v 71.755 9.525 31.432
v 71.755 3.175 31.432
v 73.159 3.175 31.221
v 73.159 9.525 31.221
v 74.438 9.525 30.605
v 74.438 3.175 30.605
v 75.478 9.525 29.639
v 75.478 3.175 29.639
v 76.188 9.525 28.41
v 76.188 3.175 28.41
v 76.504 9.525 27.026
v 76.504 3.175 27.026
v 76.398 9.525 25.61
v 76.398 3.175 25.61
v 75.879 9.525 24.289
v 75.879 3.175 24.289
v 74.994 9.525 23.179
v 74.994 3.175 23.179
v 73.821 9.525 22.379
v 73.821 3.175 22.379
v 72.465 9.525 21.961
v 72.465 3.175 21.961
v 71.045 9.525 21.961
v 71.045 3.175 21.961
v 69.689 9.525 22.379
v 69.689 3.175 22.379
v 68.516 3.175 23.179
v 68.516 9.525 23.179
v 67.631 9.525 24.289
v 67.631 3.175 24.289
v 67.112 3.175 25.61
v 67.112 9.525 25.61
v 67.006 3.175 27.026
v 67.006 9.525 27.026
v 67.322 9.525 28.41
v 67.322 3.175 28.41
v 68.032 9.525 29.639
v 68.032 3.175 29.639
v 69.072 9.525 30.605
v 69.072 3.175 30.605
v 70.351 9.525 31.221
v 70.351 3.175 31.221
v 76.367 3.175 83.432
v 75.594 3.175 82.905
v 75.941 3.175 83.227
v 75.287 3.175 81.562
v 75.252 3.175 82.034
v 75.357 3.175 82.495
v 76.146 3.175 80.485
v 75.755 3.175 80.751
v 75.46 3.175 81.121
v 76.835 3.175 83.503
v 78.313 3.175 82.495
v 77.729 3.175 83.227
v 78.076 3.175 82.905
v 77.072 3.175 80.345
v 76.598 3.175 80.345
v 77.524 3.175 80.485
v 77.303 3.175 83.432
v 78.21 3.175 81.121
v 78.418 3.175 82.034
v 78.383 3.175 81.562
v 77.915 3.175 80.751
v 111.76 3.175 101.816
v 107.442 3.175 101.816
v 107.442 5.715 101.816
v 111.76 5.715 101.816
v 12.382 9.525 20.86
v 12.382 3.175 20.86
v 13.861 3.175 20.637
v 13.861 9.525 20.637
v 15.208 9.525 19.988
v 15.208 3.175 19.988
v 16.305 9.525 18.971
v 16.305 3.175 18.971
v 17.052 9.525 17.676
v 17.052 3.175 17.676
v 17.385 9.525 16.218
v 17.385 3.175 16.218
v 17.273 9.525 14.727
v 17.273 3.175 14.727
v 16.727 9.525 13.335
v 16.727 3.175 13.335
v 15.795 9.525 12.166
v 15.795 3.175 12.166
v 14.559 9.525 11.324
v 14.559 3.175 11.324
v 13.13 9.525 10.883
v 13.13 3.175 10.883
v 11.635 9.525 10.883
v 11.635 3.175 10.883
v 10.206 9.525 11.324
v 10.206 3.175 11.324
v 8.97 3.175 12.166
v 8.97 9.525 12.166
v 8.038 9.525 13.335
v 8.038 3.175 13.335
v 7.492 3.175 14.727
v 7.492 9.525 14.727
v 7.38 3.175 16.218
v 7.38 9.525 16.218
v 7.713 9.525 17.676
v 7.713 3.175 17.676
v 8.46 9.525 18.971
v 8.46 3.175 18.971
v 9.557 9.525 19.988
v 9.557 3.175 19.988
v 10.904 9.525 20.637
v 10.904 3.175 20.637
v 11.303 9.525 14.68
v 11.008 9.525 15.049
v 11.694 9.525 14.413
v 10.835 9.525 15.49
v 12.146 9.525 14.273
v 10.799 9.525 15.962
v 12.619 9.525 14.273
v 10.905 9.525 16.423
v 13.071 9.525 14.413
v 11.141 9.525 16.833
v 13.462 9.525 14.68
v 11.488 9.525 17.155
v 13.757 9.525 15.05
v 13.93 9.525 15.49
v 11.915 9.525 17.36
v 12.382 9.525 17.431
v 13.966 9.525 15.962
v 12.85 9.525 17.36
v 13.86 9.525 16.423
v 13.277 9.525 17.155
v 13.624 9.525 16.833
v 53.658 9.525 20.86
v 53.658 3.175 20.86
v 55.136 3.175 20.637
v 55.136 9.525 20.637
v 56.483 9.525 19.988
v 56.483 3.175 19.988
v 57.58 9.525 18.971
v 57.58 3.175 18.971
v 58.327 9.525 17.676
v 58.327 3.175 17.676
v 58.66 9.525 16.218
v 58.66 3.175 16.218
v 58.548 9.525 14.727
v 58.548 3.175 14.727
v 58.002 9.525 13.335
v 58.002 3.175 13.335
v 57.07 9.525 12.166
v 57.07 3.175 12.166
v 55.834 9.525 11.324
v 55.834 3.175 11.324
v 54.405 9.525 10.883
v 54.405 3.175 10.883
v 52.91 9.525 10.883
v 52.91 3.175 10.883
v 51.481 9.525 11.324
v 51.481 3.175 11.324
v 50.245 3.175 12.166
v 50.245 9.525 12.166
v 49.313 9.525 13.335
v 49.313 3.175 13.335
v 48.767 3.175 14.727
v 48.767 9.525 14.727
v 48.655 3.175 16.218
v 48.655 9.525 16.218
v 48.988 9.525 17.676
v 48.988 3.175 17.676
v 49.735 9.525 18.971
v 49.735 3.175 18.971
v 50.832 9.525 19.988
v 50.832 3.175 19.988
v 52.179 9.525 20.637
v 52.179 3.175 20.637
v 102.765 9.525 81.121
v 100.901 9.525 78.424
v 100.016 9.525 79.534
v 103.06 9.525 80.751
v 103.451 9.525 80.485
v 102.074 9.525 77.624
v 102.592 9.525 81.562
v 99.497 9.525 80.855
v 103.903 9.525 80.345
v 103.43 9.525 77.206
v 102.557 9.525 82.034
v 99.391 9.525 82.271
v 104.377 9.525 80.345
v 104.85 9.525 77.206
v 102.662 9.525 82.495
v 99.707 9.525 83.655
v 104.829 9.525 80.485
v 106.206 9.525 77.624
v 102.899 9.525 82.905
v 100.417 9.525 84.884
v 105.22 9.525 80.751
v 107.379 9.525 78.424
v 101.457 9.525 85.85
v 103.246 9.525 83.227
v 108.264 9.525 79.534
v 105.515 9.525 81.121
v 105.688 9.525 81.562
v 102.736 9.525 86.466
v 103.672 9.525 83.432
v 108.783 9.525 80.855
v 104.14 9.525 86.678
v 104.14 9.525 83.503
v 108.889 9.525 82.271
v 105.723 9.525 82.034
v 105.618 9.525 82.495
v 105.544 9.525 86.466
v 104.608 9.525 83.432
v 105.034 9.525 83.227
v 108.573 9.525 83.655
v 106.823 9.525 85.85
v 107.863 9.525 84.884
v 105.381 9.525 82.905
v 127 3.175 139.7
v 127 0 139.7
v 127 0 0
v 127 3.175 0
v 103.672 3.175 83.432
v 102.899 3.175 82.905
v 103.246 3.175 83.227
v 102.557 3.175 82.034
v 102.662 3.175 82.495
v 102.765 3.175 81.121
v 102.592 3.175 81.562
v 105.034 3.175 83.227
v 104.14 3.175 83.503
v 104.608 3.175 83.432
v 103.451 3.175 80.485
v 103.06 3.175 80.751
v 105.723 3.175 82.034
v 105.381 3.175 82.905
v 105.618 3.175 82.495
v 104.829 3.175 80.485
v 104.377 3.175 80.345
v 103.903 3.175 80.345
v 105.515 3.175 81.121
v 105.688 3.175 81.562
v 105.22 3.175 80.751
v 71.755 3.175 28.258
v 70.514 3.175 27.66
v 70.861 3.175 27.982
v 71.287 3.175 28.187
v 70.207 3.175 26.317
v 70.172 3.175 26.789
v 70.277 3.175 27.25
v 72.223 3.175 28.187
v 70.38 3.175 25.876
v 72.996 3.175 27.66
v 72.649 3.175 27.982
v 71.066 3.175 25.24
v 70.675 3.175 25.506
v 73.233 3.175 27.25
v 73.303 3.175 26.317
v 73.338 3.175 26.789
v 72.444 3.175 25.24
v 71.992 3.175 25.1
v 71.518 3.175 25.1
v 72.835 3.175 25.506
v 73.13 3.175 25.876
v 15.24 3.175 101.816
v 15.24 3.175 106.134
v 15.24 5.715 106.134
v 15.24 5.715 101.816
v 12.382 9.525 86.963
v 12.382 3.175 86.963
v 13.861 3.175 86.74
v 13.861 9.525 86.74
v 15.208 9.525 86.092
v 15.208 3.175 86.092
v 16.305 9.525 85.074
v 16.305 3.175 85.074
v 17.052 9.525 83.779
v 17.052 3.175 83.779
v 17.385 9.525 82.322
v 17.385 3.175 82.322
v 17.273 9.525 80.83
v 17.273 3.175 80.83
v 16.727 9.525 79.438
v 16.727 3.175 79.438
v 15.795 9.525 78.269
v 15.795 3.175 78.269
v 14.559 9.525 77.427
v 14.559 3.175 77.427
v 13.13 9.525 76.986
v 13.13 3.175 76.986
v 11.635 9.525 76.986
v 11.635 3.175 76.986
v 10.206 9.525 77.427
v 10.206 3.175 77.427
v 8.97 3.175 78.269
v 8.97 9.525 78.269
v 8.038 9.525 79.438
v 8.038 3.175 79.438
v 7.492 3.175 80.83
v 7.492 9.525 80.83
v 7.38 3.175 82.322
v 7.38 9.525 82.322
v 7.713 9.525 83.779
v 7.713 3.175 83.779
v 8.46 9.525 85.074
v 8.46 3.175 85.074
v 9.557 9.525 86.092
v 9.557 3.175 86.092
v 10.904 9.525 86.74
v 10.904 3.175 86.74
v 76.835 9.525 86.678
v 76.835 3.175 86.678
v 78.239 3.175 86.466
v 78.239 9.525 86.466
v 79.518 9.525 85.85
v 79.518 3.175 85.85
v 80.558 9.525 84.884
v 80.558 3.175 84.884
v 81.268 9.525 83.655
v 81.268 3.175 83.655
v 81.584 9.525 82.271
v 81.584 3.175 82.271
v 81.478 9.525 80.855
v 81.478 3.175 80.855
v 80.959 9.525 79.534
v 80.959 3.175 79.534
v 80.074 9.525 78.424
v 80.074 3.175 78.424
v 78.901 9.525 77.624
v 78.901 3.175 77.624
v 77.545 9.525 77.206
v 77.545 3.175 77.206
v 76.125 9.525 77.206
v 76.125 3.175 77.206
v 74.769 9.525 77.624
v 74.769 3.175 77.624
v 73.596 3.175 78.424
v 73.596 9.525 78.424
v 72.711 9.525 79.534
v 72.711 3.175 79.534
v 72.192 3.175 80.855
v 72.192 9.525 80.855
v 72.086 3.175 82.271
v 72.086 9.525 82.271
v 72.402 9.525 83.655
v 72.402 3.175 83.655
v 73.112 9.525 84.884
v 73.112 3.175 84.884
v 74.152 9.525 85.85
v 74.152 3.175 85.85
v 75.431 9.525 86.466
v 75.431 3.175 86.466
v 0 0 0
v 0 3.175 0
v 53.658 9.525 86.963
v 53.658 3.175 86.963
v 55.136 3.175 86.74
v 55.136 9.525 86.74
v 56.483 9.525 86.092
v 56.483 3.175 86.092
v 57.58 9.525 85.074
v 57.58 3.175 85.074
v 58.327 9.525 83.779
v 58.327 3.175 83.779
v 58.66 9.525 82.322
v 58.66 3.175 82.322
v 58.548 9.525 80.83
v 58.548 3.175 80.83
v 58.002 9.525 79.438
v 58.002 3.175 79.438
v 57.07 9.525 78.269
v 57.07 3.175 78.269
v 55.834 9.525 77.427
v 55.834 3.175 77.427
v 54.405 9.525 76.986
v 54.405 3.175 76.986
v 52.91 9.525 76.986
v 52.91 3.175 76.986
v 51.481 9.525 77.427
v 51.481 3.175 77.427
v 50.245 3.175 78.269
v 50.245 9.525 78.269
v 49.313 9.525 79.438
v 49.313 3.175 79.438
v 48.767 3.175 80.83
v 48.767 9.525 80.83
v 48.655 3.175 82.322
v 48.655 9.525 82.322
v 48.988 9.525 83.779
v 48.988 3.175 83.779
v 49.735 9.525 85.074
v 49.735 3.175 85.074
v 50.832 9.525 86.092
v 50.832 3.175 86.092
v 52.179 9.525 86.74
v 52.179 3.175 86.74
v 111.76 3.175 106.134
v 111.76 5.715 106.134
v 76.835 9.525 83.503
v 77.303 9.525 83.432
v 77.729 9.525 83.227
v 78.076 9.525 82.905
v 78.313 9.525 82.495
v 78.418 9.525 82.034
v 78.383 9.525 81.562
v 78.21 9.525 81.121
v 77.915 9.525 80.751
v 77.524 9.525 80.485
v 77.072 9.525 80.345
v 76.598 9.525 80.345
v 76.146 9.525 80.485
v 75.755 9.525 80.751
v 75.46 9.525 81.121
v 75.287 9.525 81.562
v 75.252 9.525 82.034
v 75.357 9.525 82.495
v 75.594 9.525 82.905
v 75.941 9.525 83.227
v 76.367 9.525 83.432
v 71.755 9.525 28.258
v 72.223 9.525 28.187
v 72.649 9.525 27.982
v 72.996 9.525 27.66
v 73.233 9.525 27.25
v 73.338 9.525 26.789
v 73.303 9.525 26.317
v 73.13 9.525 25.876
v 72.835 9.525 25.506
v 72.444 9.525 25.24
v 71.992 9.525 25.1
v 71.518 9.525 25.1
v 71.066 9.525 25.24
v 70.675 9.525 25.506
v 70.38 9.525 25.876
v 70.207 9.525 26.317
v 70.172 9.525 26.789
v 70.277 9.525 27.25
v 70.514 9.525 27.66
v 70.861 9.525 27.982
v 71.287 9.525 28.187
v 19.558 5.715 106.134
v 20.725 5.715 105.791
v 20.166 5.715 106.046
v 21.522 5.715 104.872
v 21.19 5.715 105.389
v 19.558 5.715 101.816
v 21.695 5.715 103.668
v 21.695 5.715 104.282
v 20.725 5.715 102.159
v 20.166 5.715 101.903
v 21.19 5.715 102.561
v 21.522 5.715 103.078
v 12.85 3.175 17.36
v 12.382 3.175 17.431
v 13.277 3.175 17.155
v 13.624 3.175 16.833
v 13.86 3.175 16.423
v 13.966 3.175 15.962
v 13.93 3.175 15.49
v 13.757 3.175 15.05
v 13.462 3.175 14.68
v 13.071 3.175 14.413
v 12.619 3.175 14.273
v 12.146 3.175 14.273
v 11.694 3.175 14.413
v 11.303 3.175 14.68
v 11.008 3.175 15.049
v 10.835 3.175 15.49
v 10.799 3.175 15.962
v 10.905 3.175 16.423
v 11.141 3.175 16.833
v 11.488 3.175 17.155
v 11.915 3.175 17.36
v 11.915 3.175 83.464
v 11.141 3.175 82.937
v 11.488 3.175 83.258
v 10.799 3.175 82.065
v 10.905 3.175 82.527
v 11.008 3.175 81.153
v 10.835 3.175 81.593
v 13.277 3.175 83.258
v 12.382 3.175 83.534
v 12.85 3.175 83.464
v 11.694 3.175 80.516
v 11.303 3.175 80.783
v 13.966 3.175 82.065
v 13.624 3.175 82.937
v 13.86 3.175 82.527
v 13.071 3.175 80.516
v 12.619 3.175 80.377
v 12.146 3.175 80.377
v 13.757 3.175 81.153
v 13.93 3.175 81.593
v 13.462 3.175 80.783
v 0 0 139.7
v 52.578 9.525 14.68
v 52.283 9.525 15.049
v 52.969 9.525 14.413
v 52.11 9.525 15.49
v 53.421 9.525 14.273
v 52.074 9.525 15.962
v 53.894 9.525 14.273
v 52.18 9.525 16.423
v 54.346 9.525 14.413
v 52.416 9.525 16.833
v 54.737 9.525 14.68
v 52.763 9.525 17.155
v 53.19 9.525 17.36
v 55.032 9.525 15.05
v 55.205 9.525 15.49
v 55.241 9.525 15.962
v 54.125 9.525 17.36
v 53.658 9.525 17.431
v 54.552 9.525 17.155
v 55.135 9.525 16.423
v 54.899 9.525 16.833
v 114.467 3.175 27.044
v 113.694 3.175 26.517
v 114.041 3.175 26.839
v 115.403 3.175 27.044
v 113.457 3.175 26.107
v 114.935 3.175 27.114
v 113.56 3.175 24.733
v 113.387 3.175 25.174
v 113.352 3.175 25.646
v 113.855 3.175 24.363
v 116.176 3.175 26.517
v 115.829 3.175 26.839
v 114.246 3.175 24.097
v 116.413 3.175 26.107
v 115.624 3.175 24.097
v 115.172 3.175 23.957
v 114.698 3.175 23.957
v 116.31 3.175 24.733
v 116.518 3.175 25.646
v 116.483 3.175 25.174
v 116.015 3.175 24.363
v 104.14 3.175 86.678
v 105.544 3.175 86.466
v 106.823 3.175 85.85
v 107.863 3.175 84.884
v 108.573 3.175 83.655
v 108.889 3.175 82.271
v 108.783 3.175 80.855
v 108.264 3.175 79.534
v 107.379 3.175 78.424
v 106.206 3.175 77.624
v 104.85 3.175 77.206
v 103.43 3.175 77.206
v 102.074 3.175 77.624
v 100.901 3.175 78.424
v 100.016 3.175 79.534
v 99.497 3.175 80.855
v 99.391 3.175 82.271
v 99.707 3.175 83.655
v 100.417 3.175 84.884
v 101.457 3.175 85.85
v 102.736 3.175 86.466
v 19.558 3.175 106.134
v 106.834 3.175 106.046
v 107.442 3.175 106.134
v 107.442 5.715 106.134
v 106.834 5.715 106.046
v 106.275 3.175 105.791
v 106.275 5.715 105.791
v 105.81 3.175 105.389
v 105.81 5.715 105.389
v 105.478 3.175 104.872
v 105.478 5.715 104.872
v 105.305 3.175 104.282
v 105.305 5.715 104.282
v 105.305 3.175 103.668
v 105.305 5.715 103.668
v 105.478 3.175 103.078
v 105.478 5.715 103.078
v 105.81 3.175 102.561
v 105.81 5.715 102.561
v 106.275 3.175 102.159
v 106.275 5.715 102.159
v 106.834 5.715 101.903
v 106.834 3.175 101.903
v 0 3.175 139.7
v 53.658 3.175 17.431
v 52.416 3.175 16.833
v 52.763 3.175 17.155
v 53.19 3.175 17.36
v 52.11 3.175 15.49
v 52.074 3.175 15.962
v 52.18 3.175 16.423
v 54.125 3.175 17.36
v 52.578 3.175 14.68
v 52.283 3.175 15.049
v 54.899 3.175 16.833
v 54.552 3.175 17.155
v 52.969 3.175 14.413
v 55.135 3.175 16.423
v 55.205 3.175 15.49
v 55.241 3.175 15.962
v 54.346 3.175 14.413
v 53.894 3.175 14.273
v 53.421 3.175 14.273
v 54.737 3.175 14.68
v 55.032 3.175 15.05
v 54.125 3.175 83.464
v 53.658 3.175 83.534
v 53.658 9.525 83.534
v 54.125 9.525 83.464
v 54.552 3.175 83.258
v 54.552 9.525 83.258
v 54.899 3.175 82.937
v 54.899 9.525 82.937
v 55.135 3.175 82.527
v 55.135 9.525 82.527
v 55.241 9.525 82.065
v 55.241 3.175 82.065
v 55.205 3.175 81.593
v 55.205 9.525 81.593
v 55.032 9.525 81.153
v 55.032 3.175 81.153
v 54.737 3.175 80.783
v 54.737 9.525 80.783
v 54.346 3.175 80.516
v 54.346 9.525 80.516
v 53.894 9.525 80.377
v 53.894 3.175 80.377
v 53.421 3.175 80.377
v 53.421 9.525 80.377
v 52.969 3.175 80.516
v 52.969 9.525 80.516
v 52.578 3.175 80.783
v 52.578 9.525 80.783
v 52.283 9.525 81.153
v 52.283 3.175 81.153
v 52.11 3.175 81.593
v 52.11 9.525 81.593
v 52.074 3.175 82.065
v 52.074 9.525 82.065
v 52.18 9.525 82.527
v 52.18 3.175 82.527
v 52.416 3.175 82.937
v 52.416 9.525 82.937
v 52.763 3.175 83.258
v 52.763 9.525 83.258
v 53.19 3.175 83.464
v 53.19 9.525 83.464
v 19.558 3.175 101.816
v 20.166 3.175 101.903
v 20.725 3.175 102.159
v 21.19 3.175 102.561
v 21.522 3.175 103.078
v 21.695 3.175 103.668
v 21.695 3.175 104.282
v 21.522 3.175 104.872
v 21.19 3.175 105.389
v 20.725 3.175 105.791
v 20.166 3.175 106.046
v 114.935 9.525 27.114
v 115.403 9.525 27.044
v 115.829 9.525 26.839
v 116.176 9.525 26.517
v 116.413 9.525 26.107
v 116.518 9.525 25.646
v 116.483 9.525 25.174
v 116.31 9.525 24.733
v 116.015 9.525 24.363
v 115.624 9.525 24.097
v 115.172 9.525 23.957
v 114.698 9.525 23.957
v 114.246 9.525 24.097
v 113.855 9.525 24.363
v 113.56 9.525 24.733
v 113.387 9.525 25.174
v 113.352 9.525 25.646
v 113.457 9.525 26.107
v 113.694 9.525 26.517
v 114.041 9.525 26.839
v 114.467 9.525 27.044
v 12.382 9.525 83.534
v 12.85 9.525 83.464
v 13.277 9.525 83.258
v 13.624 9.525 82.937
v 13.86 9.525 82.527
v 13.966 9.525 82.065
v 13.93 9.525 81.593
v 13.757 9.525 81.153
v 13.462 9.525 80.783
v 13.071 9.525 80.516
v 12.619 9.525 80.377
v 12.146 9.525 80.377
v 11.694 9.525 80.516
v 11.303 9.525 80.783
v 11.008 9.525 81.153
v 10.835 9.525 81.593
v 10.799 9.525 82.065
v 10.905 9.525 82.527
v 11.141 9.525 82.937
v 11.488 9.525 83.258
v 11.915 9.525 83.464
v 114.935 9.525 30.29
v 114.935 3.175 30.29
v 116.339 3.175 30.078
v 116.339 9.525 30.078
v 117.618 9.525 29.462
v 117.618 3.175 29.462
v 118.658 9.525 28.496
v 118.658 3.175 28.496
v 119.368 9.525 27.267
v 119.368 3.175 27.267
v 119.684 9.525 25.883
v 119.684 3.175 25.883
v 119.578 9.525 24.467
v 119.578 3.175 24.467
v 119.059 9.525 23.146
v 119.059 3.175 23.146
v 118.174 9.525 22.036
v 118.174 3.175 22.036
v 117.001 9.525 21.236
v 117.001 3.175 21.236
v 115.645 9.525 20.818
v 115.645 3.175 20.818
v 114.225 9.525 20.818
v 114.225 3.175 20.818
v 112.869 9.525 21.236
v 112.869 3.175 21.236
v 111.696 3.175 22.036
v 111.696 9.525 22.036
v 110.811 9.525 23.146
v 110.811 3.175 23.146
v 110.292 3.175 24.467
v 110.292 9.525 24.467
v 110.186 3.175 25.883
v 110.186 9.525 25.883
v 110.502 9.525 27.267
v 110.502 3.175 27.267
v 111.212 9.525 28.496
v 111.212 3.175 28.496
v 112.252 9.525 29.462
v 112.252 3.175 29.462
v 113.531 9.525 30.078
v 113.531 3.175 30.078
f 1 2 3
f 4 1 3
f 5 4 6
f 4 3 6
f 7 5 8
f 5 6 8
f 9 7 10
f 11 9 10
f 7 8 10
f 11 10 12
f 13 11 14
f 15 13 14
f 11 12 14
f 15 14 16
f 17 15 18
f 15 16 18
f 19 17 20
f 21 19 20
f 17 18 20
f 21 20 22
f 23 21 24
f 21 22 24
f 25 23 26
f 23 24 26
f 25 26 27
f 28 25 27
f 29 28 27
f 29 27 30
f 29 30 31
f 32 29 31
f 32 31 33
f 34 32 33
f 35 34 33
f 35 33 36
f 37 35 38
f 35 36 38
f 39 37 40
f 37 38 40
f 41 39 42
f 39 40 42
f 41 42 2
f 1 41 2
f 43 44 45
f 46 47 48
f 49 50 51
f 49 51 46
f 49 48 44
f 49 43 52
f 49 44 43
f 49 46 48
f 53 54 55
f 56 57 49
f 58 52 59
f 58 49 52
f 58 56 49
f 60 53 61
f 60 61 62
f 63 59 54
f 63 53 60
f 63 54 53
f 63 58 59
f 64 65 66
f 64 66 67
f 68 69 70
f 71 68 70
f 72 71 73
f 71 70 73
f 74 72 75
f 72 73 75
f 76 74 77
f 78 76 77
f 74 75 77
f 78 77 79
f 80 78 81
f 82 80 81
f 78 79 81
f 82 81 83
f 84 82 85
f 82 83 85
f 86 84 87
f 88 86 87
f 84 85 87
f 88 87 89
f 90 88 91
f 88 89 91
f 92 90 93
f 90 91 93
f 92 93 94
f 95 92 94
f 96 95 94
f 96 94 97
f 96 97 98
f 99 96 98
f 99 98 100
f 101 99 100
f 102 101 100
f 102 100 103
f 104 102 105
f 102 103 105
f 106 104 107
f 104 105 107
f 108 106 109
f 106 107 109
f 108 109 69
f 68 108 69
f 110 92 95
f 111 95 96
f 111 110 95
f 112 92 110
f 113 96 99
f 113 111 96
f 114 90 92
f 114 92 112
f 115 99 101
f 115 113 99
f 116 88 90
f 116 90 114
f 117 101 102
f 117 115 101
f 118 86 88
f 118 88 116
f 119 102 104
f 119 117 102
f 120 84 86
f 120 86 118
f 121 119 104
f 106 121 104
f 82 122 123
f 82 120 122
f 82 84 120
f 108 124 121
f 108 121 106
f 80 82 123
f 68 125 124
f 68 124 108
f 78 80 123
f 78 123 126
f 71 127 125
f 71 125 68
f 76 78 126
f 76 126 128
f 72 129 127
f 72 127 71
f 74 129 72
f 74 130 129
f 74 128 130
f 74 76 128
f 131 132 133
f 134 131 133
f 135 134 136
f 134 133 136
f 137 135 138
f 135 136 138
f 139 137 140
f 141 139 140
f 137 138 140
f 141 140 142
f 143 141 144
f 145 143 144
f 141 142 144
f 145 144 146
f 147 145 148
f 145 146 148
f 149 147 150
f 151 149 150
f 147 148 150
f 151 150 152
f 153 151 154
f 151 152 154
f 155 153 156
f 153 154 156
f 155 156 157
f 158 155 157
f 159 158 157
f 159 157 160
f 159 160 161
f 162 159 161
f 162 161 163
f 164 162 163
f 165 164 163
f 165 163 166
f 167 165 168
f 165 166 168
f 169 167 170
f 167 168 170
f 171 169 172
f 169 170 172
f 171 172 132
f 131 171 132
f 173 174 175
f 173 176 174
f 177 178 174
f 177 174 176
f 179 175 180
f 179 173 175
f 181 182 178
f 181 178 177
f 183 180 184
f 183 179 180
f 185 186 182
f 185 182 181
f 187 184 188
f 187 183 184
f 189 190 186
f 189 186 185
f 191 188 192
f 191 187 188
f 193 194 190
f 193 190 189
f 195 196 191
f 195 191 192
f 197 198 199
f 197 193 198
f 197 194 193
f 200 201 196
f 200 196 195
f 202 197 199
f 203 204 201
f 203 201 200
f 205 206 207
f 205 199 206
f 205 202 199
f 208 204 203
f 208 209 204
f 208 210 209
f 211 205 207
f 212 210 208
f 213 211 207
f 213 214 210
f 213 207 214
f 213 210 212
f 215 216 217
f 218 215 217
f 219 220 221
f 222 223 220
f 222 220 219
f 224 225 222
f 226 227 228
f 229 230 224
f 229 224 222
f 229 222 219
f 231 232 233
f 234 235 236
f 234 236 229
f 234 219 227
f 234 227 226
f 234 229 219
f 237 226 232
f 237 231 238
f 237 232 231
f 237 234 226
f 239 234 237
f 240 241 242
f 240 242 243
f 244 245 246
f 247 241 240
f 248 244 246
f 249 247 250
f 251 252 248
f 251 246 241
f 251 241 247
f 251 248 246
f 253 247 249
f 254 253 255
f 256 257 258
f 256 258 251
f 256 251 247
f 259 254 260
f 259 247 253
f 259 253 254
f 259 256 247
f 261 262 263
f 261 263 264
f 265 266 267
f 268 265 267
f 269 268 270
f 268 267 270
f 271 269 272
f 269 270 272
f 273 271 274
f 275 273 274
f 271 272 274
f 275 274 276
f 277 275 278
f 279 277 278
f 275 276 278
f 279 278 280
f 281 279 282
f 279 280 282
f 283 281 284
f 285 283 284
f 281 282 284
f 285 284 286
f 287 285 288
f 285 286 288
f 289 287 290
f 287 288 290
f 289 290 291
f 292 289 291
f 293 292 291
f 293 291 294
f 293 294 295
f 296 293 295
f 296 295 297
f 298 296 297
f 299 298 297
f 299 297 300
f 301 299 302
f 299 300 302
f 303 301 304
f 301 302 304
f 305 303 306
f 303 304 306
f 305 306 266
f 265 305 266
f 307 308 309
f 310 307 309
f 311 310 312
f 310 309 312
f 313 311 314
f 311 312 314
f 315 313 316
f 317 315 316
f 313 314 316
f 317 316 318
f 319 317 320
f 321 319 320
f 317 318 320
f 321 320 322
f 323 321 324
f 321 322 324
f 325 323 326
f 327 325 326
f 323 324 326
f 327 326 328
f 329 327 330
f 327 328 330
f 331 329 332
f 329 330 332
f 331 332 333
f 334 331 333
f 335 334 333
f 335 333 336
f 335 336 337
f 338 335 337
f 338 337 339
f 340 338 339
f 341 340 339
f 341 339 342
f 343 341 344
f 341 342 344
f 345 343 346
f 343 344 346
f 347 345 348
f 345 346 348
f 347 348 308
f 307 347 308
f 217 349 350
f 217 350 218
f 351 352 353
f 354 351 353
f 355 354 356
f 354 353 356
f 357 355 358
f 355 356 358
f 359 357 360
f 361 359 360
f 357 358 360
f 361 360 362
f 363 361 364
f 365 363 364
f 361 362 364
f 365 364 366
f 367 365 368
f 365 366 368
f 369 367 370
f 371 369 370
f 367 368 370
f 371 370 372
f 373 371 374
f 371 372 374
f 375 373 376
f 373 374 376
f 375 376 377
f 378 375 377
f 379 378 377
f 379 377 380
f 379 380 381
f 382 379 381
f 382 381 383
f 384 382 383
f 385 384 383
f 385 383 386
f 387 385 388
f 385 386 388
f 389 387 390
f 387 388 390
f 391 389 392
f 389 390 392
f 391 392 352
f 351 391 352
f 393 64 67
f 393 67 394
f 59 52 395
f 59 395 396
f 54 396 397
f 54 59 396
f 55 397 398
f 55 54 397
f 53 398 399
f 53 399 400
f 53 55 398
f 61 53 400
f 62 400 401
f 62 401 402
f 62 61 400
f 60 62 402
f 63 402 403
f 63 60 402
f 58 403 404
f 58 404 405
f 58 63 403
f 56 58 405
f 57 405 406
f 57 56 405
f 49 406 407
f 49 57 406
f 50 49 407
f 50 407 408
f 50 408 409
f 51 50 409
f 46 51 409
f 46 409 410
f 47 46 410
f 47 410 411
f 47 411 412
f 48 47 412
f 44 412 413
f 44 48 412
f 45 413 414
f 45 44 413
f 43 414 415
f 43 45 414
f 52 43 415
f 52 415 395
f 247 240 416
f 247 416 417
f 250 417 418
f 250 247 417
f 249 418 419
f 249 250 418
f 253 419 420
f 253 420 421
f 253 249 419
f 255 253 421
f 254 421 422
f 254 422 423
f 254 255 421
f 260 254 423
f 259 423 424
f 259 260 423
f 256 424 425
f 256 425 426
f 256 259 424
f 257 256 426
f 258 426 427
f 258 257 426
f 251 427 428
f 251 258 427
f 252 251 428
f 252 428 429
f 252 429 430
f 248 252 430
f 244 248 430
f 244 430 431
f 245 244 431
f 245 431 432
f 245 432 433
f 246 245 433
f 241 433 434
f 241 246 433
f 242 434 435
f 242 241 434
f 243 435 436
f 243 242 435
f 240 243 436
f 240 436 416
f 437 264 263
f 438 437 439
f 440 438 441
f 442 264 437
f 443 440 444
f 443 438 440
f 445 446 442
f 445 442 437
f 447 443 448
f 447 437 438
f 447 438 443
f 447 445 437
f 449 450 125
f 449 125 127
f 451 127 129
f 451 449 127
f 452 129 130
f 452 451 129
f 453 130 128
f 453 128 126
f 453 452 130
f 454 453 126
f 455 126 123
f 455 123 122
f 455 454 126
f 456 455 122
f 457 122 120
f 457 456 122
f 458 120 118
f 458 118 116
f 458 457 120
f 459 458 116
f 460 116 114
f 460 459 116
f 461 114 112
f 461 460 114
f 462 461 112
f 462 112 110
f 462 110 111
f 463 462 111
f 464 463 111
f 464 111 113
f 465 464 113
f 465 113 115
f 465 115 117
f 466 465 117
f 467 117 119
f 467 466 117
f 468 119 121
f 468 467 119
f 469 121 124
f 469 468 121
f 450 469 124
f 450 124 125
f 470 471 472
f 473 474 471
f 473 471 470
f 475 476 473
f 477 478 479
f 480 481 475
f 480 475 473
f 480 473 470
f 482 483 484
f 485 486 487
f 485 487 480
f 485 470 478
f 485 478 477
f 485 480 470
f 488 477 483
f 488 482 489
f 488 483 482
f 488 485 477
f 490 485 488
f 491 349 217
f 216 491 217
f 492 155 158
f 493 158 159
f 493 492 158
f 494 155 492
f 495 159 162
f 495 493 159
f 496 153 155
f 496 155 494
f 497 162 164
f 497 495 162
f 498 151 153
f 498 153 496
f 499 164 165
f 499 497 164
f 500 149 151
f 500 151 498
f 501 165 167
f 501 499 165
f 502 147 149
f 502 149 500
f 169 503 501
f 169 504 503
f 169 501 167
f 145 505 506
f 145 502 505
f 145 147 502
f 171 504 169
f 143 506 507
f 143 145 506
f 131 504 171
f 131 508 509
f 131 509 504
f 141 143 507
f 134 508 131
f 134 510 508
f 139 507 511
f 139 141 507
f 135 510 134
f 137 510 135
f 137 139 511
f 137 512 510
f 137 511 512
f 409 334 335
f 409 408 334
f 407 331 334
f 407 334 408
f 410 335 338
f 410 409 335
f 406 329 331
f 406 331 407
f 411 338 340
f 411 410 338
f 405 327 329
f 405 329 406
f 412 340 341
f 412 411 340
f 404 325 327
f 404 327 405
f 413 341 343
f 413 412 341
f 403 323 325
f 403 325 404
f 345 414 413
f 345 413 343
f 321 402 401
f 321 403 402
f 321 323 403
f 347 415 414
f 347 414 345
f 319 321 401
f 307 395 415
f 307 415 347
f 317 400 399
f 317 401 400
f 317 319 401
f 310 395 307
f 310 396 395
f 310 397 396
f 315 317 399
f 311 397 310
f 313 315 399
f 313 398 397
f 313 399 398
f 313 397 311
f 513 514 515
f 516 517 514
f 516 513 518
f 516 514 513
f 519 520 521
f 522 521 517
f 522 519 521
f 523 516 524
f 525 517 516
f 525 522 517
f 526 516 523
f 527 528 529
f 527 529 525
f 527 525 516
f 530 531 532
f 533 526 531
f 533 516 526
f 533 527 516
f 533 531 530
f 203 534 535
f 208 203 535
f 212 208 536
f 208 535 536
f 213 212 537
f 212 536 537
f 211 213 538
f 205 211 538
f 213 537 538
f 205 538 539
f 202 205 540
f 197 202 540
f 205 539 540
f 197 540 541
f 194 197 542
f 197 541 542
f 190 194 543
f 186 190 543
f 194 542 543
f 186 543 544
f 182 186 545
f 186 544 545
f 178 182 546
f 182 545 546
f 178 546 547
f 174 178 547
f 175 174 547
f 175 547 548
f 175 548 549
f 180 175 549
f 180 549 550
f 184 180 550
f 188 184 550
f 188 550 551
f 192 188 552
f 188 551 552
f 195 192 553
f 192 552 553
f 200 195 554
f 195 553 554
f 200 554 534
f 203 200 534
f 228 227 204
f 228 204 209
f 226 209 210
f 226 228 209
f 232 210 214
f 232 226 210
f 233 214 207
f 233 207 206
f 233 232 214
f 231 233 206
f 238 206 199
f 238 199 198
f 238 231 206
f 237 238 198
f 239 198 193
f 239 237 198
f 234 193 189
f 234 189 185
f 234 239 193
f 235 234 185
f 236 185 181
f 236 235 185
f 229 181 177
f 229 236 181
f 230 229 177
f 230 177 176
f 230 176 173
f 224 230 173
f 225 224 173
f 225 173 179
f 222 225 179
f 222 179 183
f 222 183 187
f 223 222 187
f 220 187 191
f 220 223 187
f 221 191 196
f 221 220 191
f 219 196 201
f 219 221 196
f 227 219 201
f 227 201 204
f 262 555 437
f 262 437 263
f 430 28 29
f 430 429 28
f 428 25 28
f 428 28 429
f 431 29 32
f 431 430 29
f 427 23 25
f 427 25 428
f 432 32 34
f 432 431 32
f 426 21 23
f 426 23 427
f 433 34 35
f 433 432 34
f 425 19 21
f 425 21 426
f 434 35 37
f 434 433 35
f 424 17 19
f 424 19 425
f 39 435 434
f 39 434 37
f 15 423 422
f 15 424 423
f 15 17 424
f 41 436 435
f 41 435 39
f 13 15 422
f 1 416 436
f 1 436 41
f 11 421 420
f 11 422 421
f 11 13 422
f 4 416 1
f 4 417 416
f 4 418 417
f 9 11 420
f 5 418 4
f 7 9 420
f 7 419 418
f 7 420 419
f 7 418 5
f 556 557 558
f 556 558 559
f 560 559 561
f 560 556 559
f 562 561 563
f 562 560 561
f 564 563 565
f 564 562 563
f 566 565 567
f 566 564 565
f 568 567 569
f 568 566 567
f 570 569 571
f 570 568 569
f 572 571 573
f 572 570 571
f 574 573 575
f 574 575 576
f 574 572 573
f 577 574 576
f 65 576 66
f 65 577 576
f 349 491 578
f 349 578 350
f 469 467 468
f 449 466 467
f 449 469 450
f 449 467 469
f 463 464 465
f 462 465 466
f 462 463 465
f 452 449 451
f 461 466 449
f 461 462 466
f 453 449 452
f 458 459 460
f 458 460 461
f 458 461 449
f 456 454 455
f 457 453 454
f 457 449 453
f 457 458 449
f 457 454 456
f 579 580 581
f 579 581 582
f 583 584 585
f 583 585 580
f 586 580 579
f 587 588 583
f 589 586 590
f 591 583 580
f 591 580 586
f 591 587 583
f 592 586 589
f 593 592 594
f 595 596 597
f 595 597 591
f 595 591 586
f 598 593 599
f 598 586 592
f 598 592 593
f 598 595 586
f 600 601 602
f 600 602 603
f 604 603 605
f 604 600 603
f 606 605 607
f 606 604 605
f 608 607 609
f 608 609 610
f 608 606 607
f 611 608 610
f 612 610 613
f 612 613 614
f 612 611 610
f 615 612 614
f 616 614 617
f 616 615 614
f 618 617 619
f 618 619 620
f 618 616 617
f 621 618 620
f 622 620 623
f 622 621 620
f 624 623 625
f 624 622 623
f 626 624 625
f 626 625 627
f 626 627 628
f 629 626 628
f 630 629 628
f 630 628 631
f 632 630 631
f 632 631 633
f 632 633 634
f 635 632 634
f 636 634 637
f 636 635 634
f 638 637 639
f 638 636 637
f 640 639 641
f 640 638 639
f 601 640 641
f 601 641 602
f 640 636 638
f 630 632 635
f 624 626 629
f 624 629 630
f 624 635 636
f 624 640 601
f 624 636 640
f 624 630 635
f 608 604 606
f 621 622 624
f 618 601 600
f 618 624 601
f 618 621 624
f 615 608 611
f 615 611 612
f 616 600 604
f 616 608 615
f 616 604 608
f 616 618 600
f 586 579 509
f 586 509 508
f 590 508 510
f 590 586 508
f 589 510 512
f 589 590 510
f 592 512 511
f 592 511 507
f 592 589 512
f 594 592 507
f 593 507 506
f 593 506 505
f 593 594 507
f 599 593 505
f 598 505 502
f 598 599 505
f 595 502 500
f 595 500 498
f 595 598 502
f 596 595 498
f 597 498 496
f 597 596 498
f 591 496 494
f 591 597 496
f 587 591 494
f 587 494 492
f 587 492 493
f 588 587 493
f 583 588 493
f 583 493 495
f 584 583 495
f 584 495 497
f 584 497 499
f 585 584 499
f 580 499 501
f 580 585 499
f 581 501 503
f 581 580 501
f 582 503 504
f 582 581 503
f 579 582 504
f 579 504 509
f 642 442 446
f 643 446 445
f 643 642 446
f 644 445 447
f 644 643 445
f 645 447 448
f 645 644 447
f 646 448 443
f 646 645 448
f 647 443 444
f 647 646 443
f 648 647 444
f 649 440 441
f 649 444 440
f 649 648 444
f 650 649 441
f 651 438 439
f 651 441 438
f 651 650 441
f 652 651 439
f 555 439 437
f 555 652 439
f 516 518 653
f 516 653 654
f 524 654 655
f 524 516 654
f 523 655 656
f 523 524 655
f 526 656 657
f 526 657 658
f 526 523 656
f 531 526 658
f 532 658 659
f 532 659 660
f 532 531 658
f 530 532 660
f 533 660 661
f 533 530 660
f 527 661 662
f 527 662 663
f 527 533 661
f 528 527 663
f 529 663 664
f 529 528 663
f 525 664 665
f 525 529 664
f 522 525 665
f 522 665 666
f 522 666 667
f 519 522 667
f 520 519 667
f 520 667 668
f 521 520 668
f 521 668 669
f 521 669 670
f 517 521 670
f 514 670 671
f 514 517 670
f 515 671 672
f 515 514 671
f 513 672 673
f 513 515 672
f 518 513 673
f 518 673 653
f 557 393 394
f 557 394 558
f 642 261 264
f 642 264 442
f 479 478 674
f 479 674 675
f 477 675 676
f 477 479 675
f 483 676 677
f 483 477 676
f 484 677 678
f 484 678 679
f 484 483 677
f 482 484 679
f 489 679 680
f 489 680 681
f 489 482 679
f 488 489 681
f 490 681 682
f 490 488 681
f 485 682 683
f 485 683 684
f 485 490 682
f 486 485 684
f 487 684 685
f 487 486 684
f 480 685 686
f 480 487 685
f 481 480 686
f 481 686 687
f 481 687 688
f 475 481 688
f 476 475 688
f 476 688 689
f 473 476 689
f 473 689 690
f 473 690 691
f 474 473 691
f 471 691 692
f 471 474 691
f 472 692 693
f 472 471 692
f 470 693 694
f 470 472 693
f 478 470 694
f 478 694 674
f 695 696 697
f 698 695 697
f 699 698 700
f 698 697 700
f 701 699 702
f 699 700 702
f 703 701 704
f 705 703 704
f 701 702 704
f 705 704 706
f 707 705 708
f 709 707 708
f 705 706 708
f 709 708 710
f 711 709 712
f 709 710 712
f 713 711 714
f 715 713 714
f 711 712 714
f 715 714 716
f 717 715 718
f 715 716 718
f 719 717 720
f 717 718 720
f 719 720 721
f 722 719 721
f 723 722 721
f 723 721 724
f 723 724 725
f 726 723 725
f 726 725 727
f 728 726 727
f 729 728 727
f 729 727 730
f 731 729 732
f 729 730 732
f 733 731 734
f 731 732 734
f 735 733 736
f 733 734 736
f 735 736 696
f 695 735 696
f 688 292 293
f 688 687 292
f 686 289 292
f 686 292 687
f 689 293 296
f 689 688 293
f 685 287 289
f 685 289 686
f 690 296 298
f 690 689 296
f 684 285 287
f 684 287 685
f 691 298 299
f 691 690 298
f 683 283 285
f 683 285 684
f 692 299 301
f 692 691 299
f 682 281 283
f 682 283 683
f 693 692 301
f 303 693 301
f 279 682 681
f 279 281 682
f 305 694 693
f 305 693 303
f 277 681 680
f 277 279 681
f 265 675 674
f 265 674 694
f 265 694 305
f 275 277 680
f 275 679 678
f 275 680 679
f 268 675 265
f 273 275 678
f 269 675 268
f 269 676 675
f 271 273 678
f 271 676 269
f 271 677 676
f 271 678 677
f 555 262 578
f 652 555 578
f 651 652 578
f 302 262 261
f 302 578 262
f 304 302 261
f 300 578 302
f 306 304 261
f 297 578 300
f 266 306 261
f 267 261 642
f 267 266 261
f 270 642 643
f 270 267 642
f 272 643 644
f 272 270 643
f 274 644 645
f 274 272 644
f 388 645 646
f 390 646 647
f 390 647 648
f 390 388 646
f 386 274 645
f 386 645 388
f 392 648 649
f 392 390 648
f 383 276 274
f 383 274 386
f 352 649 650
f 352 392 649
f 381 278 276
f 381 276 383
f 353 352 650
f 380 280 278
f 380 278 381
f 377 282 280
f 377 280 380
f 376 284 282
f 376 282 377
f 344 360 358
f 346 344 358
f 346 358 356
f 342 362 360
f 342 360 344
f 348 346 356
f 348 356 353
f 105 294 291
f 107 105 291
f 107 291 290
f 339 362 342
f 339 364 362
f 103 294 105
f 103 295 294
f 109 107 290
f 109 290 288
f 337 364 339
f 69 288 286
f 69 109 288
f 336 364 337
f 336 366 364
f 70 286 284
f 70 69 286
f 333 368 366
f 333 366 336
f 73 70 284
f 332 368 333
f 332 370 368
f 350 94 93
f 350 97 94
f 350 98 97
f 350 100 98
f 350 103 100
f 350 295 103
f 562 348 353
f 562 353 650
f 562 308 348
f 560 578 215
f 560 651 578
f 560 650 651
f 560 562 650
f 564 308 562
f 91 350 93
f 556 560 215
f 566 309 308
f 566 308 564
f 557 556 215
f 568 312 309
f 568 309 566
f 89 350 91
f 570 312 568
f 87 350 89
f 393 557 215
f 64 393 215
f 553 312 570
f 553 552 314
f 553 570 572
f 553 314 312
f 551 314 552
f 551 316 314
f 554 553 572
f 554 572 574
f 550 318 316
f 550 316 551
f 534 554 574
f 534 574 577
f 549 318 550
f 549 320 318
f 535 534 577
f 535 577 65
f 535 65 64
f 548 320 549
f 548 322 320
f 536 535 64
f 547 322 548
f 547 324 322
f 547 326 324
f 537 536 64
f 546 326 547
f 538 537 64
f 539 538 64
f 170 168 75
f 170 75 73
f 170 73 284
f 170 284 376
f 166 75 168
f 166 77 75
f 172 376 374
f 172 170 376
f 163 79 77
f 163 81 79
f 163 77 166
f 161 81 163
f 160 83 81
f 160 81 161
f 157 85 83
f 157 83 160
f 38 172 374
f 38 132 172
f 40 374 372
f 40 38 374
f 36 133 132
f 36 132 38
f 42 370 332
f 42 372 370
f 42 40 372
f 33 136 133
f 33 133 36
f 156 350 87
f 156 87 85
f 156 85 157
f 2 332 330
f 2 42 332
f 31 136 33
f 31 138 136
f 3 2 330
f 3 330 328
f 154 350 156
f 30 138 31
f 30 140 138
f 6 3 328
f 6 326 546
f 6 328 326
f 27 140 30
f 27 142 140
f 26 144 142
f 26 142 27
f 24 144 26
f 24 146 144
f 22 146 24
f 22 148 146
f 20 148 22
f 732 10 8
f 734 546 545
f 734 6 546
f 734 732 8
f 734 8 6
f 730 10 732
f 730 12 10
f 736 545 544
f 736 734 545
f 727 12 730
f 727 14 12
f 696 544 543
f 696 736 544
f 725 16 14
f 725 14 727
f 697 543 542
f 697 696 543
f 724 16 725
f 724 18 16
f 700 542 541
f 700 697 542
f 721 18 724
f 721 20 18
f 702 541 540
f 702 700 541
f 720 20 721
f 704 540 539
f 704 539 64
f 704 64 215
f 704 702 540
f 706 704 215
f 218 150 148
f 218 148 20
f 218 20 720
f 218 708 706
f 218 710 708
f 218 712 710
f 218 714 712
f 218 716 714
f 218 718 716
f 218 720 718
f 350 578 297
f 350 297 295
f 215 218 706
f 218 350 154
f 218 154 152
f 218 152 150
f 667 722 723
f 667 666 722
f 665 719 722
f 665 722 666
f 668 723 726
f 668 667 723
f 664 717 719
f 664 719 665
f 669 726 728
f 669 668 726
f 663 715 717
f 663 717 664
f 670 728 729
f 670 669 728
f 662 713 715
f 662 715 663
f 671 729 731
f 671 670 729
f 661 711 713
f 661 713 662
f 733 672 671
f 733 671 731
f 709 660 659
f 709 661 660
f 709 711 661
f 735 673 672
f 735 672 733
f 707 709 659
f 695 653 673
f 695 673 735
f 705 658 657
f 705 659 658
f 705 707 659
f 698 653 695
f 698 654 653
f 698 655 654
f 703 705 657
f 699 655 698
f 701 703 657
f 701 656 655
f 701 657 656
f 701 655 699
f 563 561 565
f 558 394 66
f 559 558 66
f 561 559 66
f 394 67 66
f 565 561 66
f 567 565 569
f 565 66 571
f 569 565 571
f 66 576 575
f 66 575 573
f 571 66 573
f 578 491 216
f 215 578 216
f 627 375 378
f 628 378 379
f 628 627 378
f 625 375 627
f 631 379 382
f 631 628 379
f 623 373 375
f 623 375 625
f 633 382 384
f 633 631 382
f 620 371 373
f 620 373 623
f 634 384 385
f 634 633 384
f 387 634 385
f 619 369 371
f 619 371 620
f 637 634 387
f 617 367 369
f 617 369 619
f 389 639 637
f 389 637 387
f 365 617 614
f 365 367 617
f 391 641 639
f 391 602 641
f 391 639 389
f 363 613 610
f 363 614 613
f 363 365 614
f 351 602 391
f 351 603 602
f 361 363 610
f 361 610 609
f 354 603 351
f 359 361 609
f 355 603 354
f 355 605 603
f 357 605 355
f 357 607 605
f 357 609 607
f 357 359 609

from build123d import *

# Parameters (mm, degrees)
SKETCH1_W           = 127
SKETCH1_H           = 139.7
BOSS_EXTRUDE5_DEPTH = 3.175
SKETCH2_R           = 5.0165
SKETCH2_R_2         = 1.5875
SKETCH2_R_3         = 4.7625
BOSS_EXTRUDE6_DEPTH = 6.35
CUT_EXTRUDE2_START  = -3.81
CUT_EXTRUDE2_DEPTH  = 3.81


with BuildPart() as part:
    # Sketch1 → Boss-Extrude5 (new body)
    with BuildSketch(Plane(origin=(0, 0, 0), x_dir=(1, 0, 0), z_dir=(0, 1, 0))):
        with Locations((63.5, -69.85)):
            Rectangle(SKETCH1_W, SKETCH1_H)
    extrude(amount=BOSS_EXTRUDE5_DEPTH)

    # Sketch2 → Boss-Extrude6 (add)
    # profile 1 of 10: a face of its own
    with BuildSketch(Plane(origin=(0, 3.175, 0), x_dir=(1, 0, 0), z_dir=(0, 1, 0))):
        with Locations(Location((12.3825, -15.84325, 0), (0, 0, 270))):
            Circle(SKETCH2_R)
        with Locations(Location((12.3825, -15.84325, 0), (0, 0, 270))):
            Circle(SKETCH2_R_2, mode=Mode.SUBTRACT)
    # profile 2 of 10: a face of its own
    with BuildSketch(Plane(origin=(0, 3.175, 0), x_dir=(1, 0, 0), z_dir=(0, 1, 0))):
        with Locations(Location((53.6575, -15.84325, 0), (0, 0, 270))):
            Circle(SKETCH2_R)
        with Locations(Location((53.6575, -15.84325, 0), (0, 0, 270))):
            Circle(SKETCH2_R_2, mode=Mode.SUBTRACT)
    # profile 3 of 10: a face of its own
    with BuildSketch(Plane(origin=(0, 3.175, 0), x_dir=(1, 0, 0), z_dir=(0, 1, 0))):
        with Locations(Location((71.755, -26.67, 0), (0, 0, 270))):
            Circle(SKETCH2_R_3)
        with Locations(Location((71.755, -26.67, 0), (0, 0, 270))):
            Circle(SKETCH2_R_2, mode=Mode.SUBTRACT)
    # profile 4 of 10: a face of its own
    with BuildSketch(Plane(origin=(0, 3.175, 0), x_dir=(1, 0, 0), z_dir=(0, 1, 0))):
        with Locations(Location((114.935, -25.527, 0), (0, 0, 270))):
            Circle(SKETCH2_R_3)
        with Locations(Location((114.935, -25.527, 0), (0, 0, 270))):
            Circle(SKETCH2_R_2, mode=Mode.SUBTRACT)
    # profile 5 of 10: a face of its own
    with BuildSketch(Plane(origin=(0, 3.175, 0), x_dir=(1, 0, 0), z_dir=(0, 1, 0))):
        with Locations(Location((104.14, -81.915, 0), (0, 0, 270))):
            Circle(SKETCH2_R_3)
        with Locations(Location((104.14, -81.915, 0), (0, 0, 270))):
            Circle(SKETCH2_R_2, mode=Mode.SUBTRACT)
    # profile 6 of 10: a face of its own
    with BuildSketch(Plane(origin=(0, 3.175, 0), x_dir=(1, 0, 0), z_dir=(0, 1, 0))):
        with Locations(Location((76.835, -81.915, 0), (0, 0, 270))):
            Circle(SKETCH2_R_3)
        with Locations(Location((76.835, -81.915, 0), (0, 0, 270))):
            Circle(SKETCH2_R_2, mode=Mode.SUBTRACT)
    # profile 7 of 10: a face of its own
    with BuildSketch(Plane(origin=(0, 3.175, 0), x_dir=(1, 0, 0), z_dir=(0, 1, 0))):
        with Locations(Location((53.6575, -81.94675, 0), (0, 0, 270))):
            Circle(SKETCH2_R)
        with Locations(Location((53.6575, -81.94675, 0), (0, 0, 270))):
            Circle(SKETCH2_R_2, mode=Mode.SUBTRACT)
    # profile 8 of 10: a face of its own
    with BuildSketch(Plane(origin=(0, 3.175, 0), x_dir=(1, 0, 0), z_dir=(0, 1, 0))):
        with Locations(Location((12.3825, -81.94675, 0), (0, 0, 270))):
            Circle(SKETCH2_R)
        with Locations(Location((12.3825, -81.94675, 0), (0, 0, 270))):
            Circle(SKETCH2_R_2, mode=Mode.SUBTRACT)
    # profile 9 of 10: a face of its own
    with BuildSketch(Plane(origin=(0, 3.175, 0), x_dir=(1, 0, 0), z_dir=(0, 1, 0))):
        with BuildLine():
            Line((15.24, -106.1339), (15.24, -101.8159))
            Line((15.24, -101.8159), (19.558, -101.8159))
            ThreePointArc((19.558, -101.8159), (21.717, -103.9749), (19.558, -106.1339))
            Line((19.558, -106.1339), (15.24, -106.1339))
        make_face()
    # profile 10 of 10: a face of its own
    with BuildSketch(Plane(origin=(0, 3.175, 0), x_dir=(1, 0, 0), z_dir=(0, 1, 0))):
        with BuildLine():
            Line((107.442, -101.8159), (111.76, -101.8159))
            Line((111.76, -101.8159), (111.76, -106.1339))
            Line((111.76, -106.1339), (107.442, -106.1339))
            ThreePointArc((107.442, -106.1339), (105.283, -103.9749), (107.442, -101.8159))
        make_face()
    extrude(amount=BOSS_EXTRUDE6_DEPTH)

    # Sketch3 → Cut-Extrude2 (cut)
    with BuildSketch(Plane(origin=(0, 9.525, 0), x_dir=(1, 0, 0), z_dir=(0, 1, 0)).offset(CUT_EXTRUDE2_START)):
        with BuildLine():
            Line((19.558, -101.8159), (15.24, -101.8159))
            Line((15.24, -101.8159), (15.24, -106.1339))
            Line((15.24, -106.1339), (19.558, -106.1339))
            ThreePointArc((19.558, -106.1339), (21.717, -103.9749), (19.558, -101.8159))
        make_face()
        with BuildLine():
            Line((111.76, -106.1339), (107.442, -106.1339))
            ThreePointArc((107.442, -106.1339), (105.283, -103.9749), (107.442, -101.8159))
            Line((107.442, -101.8159), (111.76, -101.8159))
            Line((111.76, -101.8159), (111.76, -106.1339))
        make_face()
    extrude(amount=CUT_EXTRUDE2_DEPTH, mode=Mode.SUBTRACT)


solid = part.part
